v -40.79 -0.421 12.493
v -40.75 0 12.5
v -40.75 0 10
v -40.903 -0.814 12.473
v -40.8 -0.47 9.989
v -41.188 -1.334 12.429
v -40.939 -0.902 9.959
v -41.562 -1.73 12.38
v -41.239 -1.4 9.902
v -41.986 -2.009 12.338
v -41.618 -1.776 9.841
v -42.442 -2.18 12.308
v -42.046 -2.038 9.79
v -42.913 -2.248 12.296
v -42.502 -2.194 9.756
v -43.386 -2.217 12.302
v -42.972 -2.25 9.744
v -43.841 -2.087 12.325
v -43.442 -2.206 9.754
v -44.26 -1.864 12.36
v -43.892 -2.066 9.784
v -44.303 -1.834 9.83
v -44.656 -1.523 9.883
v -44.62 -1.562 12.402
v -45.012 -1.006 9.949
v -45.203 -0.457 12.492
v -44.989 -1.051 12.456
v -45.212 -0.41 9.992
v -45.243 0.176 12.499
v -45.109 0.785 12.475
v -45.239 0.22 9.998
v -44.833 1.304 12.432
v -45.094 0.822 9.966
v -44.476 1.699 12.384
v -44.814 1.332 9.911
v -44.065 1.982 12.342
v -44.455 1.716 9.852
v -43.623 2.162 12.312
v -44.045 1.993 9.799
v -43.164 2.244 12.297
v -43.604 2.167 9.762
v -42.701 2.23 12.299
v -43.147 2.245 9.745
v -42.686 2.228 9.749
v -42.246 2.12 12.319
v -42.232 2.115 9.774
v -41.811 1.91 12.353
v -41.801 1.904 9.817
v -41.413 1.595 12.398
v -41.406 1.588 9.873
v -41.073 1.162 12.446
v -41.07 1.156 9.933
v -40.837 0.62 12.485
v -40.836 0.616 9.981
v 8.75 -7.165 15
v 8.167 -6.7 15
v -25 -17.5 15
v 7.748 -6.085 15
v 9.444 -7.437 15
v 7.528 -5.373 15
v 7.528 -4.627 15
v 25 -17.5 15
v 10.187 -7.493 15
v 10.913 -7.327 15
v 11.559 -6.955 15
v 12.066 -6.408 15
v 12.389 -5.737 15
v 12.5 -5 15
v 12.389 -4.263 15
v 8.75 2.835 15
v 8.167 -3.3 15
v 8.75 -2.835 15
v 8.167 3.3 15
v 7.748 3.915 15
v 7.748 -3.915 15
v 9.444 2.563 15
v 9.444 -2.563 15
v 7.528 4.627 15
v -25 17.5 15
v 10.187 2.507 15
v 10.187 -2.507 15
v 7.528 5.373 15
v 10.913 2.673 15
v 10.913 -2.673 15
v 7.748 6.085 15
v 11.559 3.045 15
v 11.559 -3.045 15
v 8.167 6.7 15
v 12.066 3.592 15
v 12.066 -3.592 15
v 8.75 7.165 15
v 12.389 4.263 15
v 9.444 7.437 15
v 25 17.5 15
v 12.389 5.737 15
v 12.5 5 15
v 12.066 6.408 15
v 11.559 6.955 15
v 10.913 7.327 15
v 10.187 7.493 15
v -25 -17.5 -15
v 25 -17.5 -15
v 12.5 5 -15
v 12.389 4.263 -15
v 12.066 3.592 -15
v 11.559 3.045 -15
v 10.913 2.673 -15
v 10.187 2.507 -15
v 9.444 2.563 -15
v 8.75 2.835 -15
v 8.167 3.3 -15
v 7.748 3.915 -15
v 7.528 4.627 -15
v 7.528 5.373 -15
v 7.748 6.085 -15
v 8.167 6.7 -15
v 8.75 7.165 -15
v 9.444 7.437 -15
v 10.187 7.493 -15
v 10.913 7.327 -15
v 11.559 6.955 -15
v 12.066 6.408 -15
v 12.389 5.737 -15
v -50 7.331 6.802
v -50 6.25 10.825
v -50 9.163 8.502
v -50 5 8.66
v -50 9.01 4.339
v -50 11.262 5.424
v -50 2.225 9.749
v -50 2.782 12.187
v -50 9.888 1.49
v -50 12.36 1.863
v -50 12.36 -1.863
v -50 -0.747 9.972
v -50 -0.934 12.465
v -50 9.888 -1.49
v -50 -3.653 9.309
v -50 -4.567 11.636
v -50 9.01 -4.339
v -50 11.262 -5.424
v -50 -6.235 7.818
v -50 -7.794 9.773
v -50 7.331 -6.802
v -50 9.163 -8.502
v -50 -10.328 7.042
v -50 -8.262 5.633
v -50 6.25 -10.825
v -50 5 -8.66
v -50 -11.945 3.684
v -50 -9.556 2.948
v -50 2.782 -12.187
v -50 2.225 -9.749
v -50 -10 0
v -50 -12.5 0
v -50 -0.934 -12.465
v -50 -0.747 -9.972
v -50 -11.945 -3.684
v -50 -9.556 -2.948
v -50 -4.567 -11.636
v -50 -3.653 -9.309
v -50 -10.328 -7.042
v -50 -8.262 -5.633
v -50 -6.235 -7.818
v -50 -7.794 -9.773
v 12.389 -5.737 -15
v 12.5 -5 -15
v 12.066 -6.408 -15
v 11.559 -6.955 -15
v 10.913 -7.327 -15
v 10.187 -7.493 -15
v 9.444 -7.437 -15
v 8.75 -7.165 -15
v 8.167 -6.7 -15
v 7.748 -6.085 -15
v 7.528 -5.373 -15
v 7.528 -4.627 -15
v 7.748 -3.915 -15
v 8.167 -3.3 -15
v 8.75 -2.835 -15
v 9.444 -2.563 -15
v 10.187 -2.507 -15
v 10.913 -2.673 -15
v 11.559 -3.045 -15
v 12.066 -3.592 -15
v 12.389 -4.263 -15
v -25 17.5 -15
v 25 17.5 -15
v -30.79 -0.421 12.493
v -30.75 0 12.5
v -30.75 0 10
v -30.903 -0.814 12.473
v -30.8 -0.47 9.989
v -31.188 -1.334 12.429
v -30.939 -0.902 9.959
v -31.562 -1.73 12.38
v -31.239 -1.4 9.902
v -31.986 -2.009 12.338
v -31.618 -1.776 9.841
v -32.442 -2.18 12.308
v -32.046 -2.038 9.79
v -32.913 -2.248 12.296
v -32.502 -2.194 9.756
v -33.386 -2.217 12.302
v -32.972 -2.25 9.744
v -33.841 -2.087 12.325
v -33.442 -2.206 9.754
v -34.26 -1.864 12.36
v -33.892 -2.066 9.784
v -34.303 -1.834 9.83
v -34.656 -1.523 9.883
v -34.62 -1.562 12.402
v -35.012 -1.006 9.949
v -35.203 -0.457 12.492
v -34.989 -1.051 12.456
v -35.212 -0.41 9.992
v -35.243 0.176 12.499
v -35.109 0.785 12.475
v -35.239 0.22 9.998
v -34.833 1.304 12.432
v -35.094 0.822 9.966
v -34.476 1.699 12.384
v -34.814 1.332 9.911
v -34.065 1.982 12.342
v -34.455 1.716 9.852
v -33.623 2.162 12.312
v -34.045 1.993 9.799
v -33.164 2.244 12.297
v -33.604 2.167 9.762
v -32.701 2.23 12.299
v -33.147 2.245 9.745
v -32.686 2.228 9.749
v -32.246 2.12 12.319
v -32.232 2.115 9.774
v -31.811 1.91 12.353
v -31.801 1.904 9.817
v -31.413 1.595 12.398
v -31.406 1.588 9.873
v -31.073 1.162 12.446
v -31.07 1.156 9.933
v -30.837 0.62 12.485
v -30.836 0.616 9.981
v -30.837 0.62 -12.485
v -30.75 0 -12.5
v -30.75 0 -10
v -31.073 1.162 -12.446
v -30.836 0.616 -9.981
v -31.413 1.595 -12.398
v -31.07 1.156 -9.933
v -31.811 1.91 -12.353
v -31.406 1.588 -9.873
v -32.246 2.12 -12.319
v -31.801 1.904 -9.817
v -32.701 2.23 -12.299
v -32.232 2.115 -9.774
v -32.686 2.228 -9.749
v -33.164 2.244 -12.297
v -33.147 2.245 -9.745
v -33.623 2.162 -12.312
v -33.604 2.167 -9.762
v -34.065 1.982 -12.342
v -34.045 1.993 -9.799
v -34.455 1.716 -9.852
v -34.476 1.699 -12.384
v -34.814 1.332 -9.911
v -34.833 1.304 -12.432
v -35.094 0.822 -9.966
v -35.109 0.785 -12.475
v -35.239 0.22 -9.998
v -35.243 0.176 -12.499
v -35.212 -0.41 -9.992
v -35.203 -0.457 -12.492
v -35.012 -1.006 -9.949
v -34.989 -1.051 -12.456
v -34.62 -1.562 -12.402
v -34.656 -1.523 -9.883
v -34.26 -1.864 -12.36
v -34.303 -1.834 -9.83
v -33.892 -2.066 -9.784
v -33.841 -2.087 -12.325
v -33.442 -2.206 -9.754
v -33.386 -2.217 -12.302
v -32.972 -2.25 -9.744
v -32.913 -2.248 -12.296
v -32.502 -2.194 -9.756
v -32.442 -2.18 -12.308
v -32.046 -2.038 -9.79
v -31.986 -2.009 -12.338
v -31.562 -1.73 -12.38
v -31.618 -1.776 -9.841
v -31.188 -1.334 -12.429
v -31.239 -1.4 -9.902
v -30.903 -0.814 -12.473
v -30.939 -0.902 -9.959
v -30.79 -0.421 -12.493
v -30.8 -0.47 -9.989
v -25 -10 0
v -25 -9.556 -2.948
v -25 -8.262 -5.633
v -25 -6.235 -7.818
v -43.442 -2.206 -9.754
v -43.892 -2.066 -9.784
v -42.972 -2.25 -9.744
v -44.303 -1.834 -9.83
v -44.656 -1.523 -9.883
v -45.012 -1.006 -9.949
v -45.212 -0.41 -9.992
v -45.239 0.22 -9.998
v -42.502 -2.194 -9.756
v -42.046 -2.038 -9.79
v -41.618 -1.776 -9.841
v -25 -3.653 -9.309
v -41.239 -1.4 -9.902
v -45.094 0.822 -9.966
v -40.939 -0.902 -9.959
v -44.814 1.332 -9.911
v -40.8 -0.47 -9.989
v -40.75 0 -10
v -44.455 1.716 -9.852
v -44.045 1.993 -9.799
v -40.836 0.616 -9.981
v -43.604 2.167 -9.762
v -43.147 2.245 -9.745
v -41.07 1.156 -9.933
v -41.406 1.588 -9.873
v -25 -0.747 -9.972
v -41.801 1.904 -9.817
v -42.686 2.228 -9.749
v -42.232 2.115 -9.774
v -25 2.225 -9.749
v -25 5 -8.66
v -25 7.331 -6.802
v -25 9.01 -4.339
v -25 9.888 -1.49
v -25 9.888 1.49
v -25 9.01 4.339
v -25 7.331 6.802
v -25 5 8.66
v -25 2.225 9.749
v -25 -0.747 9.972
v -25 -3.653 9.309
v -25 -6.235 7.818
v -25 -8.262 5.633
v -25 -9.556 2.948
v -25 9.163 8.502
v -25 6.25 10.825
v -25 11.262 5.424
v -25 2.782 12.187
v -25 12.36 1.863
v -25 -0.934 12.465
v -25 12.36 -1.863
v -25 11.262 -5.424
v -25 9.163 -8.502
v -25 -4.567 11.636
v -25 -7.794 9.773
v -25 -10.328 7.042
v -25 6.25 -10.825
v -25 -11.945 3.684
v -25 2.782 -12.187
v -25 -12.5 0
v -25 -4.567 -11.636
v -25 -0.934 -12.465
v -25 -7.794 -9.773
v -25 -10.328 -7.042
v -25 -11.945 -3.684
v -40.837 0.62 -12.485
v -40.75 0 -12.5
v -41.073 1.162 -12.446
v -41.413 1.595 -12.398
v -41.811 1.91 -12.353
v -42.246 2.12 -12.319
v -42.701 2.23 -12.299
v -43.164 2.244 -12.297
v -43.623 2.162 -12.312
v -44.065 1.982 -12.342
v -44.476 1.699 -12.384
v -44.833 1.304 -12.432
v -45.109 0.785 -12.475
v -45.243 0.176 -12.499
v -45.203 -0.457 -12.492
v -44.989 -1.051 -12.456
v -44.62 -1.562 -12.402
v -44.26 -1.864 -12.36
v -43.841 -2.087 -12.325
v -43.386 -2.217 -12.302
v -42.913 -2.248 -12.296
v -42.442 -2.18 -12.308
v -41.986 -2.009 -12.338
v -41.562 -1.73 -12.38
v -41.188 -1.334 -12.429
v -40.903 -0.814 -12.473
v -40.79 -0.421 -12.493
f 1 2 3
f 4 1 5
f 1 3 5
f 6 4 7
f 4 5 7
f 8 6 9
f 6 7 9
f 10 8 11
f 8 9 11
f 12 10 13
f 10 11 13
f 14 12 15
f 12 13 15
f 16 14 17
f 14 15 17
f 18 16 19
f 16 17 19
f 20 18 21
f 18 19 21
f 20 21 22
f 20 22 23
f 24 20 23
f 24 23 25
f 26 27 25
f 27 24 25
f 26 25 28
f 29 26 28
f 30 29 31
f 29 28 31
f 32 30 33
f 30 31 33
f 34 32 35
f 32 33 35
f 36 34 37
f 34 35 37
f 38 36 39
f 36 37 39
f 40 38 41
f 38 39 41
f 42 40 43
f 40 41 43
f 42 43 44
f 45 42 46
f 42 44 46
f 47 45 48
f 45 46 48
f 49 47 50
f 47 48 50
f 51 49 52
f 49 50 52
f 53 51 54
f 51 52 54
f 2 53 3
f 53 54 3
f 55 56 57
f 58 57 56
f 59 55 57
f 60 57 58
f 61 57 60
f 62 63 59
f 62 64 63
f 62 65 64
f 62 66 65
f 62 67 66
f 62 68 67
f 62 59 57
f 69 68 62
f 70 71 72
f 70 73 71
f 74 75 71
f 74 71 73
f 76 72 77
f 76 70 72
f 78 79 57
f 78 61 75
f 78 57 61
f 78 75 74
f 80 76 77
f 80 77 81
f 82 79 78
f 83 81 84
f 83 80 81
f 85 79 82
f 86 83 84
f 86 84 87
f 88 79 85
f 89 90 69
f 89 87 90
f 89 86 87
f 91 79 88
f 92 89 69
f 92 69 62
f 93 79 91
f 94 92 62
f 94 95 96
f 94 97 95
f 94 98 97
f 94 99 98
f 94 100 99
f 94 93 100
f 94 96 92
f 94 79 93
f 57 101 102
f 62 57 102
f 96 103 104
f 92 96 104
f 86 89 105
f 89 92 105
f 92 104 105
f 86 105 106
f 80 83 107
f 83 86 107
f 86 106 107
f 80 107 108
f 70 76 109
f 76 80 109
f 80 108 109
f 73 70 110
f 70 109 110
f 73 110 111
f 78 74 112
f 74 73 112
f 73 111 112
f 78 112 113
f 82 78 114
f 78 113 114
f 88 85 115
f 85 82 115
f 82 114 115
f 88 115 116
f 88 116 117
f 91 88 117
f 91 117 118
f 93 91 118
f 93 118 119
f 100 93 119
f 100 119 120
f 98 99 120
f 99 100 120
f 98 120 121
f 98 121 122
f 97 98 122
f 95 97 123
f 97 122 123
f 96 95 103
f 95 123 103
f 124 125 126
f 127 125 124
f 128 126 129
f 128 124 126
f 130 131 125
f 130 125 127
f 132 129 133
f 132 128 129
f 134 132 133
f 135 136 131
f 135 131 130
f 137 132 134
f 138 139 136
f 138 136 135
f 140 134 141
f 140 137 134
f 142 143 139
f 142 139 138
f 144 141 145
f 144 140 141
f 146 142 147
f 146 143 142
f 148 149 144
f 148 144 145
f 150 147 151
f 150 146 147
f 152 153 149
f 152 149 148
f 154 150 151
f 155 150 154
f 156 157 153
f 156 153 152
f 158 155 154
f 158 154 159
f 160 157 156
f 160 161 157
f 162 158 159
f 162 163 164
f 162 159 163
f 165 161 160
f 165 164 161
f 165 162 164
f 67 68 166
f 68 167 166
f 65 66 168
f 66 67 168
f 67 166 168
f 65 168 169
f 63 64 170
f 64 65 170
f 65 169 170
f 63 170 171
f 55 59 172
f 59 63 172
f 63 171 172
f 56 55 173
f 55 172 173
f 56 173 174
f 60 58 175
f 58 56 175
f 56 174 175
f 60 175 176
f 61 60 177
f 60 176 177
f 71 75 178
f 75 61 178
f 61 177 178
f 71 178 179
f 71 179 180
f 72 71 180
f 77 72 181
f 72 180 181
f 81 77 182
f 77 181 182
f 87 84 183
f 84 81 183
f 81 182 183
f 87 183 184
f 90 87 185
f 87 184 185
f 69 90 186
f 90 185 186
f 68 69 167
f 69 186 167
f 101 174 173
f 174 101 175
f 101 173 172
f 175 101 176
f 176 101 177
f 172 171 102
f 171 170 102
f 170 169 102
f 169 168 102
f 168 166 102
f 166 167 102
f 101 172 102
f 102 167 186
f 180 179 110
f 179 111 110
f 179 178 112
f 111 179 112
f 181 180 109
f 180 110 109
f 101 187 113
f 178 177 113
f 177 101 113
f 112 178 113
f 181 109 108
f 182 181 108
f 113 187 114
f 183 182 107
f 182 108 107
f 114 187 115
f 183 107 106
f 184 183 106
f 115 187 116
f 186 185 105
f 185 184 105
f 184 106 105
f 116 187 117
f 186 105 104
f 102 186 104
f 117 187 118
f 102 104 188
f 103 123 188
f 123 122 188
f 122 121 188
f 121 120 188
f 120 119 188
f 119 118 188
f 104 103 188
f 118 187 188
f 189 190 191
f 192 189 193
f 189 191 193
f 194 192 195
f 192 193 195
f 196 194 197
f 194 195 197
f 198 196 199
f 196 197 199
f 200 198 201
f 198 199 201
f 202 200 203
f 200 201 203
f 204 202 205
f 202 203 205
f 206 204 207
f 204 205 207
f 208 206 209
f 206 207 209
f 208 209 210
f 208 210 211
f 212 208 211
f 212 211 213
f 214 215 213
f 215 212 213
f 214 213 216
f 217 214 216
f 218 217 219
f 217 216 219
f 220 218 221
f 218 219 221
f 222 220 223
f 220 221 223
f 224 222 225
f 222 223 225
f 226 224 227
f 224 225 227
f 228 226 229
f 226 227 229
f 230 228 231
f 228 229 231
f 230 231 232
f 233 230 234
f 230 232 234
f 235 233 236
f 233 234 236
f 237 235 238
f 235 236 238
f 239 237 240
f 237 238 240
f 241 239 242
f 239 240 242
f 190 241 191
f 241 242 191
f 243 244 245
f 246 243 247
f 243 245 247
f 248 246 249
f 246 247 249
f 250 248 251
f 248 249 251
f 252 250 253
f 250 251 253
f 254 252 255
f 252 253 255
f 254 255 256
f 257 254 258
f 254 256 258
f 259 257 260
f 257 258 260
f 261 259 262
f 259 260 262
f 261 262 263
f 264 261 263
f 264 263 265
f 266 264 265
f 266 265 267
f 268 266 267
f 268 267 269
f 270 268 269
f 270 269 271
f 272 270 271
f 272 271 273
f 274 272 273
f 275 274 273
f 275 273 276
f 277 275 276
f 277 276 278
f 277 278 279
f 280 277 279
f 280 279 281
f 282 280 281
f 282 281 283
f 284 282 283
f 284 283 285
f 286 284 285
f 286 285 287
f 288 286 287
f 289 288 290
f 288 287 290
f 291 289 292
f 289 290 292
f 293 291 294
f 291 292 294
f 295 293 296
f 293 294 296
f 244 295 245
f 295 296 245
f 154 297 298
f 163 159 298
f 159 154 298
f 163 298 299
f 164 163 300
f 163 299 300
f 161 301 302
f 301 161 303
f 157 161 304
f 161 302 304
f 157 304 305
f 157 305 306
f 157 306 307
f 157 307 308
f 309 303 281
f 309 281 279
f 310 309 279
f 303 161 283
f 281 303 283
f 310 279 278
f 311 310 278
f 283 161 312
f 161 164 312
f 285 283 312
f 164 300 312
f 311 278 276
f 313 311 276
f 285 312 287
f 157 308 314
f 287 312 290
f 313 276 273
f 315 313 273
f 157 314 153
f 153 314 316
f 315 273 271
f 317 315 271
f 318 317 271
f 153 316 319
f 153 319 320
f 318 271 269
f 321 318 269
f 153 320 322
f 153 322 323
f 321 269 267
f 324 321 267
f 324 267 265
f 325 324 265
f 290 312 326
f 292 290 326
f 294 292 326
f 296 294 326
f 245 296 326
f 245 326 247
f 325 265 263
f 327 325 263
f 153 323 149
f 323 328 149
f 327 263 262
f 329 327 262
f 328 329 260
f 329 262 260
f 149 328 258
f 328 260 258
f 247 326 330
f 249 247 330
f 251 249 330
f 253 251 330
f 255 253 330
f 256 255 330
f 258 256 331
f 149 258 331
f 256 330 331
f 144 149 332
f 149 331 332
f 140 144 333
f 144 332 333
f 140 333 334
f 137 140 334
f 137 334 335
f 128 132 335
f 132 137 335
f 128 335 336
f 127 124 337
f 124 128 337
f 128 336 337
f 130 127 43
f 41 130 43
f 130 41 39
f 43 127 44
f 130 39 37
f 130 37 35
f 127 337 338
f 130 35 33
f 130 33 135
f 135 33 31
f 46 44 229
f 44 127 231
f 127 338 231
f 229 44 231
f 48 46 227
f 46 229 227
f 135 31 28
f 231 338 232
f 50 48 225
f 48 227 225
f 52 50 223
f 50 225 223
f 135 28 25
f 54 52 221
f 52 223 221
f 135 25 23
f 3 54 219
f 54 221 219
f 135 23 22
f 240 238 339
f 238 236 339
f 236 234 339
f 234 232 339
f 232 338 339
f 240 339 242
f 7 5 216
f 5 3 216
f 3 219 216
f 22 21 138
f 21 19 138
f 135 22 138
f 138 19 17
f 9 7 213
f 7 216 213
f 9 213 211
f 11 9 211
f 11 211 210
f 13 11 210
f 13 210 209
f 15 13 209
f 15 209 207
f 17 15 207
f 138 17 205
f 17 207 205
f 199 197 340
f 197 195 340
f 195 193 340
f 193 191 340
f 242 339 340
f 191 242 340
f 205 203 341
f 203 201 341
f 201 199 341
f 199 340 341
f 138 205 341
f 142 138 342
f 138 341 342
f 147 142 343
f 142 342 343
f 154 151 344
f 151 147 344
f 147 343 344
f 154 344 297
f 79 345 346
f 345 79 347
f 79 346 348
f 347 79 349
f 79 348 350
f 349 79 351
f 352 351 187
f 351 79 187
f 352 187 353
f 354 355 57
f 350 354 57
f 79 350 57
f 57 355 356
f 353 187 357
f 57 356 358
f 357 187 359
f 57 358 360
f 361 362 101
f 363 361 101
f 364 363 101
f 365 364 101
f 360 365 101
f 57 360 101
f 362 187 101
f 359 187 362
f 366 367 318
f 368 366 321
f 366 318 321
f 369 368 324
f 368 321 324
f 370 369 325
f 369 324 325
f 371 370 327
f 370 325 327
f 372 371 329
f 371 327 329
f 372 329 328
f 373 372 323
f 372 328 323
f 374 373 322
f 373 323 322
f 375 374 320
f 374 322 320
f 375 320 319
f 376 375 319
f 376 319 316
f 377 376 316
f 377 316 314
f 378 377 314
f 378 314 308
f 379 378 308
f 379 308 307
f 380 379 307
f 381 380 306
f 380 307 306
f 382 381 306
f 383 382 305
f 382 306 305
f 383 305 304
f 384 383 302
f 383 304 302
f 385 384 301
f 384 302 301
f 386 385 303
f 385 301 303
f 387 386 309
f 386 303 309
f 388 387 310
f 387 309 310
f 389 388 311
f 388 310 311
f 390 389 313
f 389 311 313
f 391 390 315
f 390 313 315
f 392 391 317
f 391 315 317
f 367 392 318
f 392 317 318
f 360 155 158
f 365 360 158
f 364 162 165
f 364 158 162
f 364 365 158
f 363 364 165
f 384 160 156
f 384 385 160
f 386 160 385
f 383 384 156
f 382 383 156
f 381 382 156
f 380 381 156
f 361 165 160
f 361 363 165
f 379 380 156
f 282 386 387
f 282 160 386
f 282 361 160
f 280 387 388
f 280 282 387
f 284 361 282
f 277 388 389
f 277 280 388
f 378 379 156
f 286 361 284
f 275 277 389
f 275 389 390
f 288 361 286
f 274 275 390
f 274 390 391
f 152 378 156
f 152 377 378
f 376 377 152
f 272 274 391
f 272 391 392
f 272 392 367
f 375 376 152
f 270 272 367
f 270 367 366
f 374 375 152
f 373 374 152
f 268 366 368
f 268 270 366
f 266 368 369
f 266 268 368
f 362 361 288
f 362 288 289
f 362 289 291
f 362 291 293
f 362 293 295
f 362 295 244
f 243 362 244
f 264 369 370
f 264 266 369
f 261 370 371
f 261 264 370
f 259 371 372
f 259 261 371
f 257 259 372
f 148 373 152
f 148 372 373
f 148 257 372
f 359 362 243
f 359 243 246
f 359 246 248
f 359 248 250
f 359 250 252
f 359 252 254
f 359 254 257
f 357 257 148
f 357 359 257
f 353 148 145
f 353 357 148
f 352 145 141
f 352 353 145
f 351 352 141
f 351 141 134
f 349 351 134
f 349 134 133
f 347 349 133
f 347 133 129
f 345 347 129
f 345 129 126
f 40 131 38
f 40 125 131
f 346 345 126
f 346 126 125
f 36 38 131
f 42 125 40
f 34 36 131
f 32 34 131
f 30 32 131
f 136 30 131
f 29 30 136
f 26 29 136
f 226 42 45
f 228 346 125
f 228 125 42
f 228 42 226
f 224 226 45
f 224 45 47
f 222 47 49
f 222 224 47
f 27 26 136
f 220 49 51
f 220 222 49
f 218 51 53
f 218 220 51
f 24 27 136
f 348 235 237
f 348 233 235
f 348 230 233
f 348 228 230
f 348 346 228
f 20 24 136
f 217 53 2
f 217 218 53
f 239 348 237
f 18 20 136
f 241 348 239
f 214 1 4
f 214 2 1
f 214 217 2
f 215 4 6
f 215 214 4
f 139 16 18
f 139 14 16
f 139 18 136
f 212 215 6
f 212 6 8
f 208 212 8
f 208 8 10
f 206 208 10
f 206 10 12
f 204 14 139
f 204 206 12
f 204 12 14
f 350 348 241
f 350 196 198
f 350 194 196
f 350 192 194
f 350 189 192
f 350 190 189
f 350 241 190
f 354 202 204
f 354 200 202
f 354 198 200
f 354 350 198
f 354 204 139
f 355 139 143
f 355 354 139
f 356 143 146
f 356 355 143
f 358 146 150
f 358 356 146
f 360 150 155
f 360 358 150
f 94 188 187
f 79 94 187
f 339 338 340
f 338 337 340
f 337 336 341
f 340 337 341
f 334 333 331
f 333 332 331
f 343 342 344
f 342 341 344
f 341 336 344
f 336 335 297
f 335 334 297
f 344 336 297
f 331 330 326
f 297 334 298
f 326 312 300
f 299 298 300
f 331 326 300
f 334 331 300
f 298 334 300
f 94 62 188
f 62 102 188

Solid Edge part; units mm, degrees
sketch "Sketch1" plane through (0, 0, 0) normal (0, 0, 1) x (1, 0, 0)
  circle A0 centre (10, 5) radius 2.5
  circle A1 centre (10, -5) radius 2.5
  line L0 (-25, -17.5) -> (25, -17.5)
  line L1 (25, -17.5) -> (25, 17.5)
  line L2 (25, 17.5) -> (-25, 17.5)
  line L3 (-25, 17.5) -> (-25, -17.5)
  dimension "D1" = 5
extrude "Protrusion1" add sketch "Sketch1" along normal mid plane 30
sketch "Sketch2" plane through (-25, 0, 0) normal (-1, 0, 0) x (0, -1, 0)
  circle A0 centre (0, 0) radius 10
  circle A1 centre (0, 0) radius 12.5
extrude "ExtrudedProtrusion_2" add sketch "Sketch2" along normal mid plane 50
sketch "Sketch3" plane through (0, 0, 0) normal (0, 0, 1) x (1, 0, 0)
  circle A0 centre (-43, 0) radius 2.25
  circle A1 centre (-33, 0) radius 2.25
extrude "ExtrudedCutout_1" cut sketch "Sketch3" along normal mid plane 87.851
properties material "PVC"
